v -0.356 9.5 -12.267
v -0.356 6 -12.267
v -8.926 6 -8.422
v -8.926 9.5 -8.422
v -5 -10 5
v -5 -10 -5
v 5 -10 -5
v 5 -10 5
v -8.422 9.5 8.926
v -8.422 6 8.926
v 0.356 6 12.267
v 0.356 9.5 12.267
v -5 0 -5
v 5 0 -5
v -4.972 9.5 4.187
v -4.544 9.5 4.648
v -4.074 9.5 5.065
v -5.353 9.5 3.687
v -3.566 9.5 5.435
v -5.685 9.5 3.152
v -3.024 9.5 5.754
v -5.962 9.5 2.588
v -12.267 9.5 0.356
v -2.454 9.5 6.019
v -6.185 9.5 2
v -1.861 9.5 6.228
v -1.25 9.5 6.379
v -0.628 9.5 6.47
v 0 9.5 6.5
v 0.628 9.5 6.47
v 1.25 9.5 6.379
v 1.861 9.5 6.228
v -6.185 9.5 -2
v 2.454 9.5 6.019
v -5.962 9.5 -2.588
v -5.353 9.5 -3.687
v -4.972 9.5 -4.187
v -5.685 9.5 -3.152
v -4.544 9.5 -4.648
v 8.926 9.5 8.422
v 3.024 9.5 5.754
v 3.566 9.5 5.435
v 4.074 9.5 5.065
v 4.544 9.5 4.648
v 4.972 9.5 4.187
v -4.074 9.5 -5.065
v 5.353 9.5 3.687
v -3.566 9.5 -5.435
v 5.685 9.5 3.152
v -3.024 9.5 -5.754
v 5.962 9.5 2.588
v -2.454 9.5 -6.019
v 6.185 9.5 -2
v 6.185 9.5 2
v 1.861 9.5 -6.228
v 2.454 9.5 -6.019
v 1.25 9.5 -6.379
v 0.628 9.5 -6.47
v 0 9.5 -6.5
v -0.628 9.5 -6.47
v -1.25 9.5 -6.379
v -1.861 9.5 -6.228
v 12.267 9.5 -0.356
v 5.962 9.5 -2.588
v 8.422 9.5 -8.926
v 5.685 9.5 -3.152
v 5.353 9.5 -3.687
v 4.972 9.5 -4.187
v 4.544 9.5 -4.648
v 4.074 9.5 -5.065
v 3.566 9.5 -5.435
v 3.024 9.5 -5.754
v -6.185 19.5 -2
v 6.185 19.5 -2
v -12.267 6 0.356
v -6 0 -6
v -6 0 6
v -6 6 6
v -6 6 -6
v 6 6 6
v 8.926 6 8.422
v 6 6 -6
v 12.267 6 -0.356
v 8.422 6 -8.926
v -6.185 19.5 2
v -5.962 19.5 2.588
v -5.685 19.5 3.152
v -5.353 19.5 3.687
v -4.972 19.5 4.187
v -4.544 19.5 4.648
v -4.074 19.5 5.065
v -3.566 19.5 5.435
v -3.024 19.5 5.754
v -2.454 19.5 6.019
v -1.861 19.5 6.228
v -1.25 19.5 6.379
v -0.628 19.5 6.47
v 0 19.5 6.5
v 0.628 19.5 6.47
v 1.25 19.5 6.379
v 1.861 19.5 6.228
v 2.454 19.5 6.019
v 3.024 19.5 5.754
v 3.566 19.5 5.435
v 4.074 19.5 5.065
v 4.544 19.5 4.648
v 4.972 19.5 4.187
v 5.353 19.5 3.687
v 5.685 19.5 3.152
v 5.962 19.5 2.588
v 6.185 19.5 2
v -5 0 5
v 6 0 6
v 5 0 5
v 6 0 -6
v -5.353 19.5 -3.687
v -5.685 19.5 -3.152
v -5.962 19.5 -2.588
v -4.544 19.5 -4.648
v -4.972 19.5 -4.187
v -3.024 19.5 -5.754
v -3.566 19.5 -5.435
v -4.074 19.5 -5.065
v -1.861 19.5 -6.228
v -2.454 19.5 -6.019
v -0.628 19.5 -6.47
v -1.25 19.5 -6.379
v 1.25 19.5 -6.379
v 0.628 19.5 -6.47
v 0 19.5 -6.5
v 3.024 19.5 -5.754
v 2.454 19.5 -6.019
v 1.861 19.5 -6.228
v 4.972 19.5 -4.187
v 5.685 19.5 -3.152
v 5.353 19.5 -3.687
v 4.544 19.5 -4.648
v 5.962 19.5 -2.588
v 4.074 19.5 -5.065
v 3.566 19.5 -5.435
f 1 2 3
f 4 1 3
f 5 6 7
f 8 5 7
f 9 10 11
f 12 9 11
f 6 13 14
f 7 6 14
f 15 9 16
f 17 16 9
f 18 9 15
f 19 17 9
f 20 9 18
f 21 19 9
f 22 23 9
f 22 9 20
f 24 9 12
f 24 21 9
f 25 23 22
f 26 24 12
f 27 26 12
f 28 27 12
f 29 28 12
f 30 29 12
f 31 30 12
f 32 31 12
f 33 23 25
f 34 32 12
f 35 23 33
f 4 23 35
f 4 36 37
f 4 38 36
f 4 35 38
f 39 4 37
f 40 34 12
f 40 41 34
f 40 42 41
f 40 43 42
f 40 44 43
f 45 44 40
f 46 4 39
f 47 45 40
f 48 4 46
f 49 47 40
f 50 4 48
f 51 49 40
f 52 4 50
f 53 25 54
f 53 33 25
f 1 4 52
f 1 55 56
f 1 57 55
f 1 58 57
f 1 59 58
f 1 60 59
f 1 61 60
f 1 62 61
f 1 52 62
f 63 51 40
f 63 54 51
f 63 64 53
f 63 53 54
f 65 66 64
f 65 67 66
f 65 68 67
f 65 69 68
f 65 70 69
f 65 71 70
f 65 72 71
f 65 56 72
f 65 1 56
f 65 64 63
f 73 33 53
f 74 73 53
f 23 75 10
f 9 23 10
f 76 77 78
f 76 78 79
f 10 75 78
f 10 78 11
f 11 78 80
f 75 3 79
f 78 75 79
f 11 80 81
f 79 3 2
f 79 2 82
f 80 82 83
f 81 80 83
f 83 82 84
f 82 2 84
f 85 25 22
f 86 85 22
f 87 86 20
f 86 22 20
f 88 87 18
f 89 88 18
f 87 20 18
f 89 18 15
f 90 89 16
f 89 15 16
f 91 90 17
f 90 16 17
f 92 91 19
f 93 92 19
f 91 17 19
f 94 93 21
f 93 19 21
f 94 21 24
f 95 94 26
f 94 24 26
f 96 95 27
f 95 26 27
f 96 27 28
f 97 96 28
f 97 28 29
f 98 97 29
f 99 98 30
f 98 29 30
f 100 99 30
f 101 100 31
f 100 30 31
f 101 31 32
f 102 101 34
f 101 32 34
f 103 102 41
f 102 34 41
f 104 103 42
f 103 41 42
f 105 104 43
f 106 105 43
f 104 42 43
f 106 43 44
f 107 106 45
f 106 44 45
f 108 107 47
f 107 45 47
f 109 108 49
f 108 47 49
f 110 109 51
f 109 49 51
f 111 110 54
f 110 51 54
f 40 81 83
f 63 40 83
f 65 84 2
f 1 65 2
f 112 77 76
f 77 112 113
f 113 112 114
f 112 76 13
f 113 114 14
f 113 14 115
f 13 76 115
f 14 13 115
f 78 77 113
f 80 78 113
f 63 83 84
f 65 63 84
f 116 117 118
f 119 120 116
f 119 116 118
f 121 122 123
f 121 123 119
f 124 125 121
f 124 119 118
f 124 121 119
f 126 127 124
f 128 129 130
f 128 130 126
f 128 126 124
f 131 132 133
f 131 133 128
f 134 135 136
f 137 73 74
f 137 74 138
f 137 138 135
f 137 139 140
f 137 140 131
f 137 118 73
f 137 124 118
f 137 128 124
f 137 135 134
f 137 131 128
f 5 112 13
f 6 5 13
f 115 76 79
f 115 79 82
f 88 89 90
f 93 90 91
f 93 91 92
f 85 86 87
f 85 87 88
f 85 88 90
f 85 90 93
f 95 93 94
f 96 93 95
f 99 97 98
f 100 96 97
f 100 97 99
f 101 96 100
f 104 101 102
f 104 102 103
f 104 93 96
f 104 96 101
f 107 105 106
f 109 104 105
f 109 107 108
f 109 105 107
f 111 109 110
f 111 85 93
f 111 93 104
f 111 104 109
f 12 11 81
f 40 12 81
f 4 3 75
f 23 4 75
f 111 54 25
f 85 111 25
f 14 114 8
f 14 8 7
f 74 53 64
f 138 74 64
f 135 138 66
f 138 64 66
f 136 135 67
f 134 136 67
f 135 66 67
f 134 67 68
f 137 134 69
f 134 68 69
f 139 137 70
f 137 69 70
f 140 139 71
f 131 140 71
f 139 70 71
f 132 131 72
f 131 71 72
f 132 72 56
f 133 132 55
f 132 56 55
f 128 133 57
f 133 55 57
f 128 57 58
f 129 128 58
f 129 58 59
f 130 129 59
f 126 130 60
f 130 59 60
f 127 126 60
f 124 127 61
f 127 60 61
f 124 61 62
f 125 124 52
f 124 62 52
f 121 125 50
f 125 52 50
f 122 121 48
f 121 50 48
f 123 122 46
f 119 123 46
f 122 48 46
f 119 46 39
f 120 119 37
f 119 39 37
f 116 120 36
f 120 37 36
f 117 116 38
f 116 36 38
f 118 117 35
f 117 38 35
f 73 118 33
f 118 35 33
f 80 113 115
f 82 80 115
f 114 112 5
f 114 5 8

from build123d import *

# Parameters (mm, degrees)
SKETCH1_W            = 10
SKETCH1_H            = 10
BOSS_EXTRUDE1_DEPTH  = 10
SKETCH2_W            = 12
SKETCH2_H            = 12
BOSS_EXTRUDE5_DEPTH  = 6
BOSS_EXTRUDE6_DEPTH  = 3.5
BOSS_EXTRUDE11_DEPTH = 10


with BuildPart() as part:
    # Sketch1 → Boss-Extrude1 (new body)
    with BuildSketch(Plane(origin=(0, 0, 0), x_dir=(1, 0, 0), z_dir=(0, 1, 0))):
        Rectangle(SKETCH1_W, SKETCH1_H)
    extrude(amount=-BOSS_EXTRUDE1_DEPTH)

    # Sketch2 → Boss-Extrude5 (add)
    with BuildSketch(Plane(origin=(0, 0, 0), x_dir=(1, 0, 0), z_dir=(0, 1, 0))):
        Rectangle(SKETCH2_W, SKETCH2_H)
    extrude(amount=BOSS_EXTRUDE5_DEPTH)

    # Sketch4 → Boss-Extrude6 (add)
    with BuildSketch(Plane(origin=(0, 6, 0), x_dir=(1, 0, 0), z_dir=(0, 1, 0))):
        Polygon((0.35623678, -12.266936068), (8.925931121, -8.422136236), (12.266936068, 0.35623678), (8.422136236, 8.925931121), (-0.35623678, 12.266936068), (-8.925931121, 8.422136236), (-12.266936068, -0.35623678), (-8.422136236, -8.925931121), align=None)
    extrude(amount=BOSS_EXTRUDE6_DEPTH)

    # Sketch8 → Boss-Extrude11 (add)
    with BuildSketch(Plane(origin=(0, 9.5, 0), x_dir=(1, 0, 0), z_dir=(0, 1, 0))):
        with BuildLine():
            Line((-6.184658438, 2), (6.184658438, 2))
            ThreePointArc((6.184658438, 2), (0, 6.5), (-6.184658438, 2))
        make_face()
        with BuildLine():
            Line((6.184658438, -2), (-6.184658438, -2))
            ThreePointArc((-6.184658438, -2), (0, -6.5), (6.184658438, -2))
        make_face()
    extrude(amount=BOSS_EXTRUDE11_DEPTH)


solid = part.part
